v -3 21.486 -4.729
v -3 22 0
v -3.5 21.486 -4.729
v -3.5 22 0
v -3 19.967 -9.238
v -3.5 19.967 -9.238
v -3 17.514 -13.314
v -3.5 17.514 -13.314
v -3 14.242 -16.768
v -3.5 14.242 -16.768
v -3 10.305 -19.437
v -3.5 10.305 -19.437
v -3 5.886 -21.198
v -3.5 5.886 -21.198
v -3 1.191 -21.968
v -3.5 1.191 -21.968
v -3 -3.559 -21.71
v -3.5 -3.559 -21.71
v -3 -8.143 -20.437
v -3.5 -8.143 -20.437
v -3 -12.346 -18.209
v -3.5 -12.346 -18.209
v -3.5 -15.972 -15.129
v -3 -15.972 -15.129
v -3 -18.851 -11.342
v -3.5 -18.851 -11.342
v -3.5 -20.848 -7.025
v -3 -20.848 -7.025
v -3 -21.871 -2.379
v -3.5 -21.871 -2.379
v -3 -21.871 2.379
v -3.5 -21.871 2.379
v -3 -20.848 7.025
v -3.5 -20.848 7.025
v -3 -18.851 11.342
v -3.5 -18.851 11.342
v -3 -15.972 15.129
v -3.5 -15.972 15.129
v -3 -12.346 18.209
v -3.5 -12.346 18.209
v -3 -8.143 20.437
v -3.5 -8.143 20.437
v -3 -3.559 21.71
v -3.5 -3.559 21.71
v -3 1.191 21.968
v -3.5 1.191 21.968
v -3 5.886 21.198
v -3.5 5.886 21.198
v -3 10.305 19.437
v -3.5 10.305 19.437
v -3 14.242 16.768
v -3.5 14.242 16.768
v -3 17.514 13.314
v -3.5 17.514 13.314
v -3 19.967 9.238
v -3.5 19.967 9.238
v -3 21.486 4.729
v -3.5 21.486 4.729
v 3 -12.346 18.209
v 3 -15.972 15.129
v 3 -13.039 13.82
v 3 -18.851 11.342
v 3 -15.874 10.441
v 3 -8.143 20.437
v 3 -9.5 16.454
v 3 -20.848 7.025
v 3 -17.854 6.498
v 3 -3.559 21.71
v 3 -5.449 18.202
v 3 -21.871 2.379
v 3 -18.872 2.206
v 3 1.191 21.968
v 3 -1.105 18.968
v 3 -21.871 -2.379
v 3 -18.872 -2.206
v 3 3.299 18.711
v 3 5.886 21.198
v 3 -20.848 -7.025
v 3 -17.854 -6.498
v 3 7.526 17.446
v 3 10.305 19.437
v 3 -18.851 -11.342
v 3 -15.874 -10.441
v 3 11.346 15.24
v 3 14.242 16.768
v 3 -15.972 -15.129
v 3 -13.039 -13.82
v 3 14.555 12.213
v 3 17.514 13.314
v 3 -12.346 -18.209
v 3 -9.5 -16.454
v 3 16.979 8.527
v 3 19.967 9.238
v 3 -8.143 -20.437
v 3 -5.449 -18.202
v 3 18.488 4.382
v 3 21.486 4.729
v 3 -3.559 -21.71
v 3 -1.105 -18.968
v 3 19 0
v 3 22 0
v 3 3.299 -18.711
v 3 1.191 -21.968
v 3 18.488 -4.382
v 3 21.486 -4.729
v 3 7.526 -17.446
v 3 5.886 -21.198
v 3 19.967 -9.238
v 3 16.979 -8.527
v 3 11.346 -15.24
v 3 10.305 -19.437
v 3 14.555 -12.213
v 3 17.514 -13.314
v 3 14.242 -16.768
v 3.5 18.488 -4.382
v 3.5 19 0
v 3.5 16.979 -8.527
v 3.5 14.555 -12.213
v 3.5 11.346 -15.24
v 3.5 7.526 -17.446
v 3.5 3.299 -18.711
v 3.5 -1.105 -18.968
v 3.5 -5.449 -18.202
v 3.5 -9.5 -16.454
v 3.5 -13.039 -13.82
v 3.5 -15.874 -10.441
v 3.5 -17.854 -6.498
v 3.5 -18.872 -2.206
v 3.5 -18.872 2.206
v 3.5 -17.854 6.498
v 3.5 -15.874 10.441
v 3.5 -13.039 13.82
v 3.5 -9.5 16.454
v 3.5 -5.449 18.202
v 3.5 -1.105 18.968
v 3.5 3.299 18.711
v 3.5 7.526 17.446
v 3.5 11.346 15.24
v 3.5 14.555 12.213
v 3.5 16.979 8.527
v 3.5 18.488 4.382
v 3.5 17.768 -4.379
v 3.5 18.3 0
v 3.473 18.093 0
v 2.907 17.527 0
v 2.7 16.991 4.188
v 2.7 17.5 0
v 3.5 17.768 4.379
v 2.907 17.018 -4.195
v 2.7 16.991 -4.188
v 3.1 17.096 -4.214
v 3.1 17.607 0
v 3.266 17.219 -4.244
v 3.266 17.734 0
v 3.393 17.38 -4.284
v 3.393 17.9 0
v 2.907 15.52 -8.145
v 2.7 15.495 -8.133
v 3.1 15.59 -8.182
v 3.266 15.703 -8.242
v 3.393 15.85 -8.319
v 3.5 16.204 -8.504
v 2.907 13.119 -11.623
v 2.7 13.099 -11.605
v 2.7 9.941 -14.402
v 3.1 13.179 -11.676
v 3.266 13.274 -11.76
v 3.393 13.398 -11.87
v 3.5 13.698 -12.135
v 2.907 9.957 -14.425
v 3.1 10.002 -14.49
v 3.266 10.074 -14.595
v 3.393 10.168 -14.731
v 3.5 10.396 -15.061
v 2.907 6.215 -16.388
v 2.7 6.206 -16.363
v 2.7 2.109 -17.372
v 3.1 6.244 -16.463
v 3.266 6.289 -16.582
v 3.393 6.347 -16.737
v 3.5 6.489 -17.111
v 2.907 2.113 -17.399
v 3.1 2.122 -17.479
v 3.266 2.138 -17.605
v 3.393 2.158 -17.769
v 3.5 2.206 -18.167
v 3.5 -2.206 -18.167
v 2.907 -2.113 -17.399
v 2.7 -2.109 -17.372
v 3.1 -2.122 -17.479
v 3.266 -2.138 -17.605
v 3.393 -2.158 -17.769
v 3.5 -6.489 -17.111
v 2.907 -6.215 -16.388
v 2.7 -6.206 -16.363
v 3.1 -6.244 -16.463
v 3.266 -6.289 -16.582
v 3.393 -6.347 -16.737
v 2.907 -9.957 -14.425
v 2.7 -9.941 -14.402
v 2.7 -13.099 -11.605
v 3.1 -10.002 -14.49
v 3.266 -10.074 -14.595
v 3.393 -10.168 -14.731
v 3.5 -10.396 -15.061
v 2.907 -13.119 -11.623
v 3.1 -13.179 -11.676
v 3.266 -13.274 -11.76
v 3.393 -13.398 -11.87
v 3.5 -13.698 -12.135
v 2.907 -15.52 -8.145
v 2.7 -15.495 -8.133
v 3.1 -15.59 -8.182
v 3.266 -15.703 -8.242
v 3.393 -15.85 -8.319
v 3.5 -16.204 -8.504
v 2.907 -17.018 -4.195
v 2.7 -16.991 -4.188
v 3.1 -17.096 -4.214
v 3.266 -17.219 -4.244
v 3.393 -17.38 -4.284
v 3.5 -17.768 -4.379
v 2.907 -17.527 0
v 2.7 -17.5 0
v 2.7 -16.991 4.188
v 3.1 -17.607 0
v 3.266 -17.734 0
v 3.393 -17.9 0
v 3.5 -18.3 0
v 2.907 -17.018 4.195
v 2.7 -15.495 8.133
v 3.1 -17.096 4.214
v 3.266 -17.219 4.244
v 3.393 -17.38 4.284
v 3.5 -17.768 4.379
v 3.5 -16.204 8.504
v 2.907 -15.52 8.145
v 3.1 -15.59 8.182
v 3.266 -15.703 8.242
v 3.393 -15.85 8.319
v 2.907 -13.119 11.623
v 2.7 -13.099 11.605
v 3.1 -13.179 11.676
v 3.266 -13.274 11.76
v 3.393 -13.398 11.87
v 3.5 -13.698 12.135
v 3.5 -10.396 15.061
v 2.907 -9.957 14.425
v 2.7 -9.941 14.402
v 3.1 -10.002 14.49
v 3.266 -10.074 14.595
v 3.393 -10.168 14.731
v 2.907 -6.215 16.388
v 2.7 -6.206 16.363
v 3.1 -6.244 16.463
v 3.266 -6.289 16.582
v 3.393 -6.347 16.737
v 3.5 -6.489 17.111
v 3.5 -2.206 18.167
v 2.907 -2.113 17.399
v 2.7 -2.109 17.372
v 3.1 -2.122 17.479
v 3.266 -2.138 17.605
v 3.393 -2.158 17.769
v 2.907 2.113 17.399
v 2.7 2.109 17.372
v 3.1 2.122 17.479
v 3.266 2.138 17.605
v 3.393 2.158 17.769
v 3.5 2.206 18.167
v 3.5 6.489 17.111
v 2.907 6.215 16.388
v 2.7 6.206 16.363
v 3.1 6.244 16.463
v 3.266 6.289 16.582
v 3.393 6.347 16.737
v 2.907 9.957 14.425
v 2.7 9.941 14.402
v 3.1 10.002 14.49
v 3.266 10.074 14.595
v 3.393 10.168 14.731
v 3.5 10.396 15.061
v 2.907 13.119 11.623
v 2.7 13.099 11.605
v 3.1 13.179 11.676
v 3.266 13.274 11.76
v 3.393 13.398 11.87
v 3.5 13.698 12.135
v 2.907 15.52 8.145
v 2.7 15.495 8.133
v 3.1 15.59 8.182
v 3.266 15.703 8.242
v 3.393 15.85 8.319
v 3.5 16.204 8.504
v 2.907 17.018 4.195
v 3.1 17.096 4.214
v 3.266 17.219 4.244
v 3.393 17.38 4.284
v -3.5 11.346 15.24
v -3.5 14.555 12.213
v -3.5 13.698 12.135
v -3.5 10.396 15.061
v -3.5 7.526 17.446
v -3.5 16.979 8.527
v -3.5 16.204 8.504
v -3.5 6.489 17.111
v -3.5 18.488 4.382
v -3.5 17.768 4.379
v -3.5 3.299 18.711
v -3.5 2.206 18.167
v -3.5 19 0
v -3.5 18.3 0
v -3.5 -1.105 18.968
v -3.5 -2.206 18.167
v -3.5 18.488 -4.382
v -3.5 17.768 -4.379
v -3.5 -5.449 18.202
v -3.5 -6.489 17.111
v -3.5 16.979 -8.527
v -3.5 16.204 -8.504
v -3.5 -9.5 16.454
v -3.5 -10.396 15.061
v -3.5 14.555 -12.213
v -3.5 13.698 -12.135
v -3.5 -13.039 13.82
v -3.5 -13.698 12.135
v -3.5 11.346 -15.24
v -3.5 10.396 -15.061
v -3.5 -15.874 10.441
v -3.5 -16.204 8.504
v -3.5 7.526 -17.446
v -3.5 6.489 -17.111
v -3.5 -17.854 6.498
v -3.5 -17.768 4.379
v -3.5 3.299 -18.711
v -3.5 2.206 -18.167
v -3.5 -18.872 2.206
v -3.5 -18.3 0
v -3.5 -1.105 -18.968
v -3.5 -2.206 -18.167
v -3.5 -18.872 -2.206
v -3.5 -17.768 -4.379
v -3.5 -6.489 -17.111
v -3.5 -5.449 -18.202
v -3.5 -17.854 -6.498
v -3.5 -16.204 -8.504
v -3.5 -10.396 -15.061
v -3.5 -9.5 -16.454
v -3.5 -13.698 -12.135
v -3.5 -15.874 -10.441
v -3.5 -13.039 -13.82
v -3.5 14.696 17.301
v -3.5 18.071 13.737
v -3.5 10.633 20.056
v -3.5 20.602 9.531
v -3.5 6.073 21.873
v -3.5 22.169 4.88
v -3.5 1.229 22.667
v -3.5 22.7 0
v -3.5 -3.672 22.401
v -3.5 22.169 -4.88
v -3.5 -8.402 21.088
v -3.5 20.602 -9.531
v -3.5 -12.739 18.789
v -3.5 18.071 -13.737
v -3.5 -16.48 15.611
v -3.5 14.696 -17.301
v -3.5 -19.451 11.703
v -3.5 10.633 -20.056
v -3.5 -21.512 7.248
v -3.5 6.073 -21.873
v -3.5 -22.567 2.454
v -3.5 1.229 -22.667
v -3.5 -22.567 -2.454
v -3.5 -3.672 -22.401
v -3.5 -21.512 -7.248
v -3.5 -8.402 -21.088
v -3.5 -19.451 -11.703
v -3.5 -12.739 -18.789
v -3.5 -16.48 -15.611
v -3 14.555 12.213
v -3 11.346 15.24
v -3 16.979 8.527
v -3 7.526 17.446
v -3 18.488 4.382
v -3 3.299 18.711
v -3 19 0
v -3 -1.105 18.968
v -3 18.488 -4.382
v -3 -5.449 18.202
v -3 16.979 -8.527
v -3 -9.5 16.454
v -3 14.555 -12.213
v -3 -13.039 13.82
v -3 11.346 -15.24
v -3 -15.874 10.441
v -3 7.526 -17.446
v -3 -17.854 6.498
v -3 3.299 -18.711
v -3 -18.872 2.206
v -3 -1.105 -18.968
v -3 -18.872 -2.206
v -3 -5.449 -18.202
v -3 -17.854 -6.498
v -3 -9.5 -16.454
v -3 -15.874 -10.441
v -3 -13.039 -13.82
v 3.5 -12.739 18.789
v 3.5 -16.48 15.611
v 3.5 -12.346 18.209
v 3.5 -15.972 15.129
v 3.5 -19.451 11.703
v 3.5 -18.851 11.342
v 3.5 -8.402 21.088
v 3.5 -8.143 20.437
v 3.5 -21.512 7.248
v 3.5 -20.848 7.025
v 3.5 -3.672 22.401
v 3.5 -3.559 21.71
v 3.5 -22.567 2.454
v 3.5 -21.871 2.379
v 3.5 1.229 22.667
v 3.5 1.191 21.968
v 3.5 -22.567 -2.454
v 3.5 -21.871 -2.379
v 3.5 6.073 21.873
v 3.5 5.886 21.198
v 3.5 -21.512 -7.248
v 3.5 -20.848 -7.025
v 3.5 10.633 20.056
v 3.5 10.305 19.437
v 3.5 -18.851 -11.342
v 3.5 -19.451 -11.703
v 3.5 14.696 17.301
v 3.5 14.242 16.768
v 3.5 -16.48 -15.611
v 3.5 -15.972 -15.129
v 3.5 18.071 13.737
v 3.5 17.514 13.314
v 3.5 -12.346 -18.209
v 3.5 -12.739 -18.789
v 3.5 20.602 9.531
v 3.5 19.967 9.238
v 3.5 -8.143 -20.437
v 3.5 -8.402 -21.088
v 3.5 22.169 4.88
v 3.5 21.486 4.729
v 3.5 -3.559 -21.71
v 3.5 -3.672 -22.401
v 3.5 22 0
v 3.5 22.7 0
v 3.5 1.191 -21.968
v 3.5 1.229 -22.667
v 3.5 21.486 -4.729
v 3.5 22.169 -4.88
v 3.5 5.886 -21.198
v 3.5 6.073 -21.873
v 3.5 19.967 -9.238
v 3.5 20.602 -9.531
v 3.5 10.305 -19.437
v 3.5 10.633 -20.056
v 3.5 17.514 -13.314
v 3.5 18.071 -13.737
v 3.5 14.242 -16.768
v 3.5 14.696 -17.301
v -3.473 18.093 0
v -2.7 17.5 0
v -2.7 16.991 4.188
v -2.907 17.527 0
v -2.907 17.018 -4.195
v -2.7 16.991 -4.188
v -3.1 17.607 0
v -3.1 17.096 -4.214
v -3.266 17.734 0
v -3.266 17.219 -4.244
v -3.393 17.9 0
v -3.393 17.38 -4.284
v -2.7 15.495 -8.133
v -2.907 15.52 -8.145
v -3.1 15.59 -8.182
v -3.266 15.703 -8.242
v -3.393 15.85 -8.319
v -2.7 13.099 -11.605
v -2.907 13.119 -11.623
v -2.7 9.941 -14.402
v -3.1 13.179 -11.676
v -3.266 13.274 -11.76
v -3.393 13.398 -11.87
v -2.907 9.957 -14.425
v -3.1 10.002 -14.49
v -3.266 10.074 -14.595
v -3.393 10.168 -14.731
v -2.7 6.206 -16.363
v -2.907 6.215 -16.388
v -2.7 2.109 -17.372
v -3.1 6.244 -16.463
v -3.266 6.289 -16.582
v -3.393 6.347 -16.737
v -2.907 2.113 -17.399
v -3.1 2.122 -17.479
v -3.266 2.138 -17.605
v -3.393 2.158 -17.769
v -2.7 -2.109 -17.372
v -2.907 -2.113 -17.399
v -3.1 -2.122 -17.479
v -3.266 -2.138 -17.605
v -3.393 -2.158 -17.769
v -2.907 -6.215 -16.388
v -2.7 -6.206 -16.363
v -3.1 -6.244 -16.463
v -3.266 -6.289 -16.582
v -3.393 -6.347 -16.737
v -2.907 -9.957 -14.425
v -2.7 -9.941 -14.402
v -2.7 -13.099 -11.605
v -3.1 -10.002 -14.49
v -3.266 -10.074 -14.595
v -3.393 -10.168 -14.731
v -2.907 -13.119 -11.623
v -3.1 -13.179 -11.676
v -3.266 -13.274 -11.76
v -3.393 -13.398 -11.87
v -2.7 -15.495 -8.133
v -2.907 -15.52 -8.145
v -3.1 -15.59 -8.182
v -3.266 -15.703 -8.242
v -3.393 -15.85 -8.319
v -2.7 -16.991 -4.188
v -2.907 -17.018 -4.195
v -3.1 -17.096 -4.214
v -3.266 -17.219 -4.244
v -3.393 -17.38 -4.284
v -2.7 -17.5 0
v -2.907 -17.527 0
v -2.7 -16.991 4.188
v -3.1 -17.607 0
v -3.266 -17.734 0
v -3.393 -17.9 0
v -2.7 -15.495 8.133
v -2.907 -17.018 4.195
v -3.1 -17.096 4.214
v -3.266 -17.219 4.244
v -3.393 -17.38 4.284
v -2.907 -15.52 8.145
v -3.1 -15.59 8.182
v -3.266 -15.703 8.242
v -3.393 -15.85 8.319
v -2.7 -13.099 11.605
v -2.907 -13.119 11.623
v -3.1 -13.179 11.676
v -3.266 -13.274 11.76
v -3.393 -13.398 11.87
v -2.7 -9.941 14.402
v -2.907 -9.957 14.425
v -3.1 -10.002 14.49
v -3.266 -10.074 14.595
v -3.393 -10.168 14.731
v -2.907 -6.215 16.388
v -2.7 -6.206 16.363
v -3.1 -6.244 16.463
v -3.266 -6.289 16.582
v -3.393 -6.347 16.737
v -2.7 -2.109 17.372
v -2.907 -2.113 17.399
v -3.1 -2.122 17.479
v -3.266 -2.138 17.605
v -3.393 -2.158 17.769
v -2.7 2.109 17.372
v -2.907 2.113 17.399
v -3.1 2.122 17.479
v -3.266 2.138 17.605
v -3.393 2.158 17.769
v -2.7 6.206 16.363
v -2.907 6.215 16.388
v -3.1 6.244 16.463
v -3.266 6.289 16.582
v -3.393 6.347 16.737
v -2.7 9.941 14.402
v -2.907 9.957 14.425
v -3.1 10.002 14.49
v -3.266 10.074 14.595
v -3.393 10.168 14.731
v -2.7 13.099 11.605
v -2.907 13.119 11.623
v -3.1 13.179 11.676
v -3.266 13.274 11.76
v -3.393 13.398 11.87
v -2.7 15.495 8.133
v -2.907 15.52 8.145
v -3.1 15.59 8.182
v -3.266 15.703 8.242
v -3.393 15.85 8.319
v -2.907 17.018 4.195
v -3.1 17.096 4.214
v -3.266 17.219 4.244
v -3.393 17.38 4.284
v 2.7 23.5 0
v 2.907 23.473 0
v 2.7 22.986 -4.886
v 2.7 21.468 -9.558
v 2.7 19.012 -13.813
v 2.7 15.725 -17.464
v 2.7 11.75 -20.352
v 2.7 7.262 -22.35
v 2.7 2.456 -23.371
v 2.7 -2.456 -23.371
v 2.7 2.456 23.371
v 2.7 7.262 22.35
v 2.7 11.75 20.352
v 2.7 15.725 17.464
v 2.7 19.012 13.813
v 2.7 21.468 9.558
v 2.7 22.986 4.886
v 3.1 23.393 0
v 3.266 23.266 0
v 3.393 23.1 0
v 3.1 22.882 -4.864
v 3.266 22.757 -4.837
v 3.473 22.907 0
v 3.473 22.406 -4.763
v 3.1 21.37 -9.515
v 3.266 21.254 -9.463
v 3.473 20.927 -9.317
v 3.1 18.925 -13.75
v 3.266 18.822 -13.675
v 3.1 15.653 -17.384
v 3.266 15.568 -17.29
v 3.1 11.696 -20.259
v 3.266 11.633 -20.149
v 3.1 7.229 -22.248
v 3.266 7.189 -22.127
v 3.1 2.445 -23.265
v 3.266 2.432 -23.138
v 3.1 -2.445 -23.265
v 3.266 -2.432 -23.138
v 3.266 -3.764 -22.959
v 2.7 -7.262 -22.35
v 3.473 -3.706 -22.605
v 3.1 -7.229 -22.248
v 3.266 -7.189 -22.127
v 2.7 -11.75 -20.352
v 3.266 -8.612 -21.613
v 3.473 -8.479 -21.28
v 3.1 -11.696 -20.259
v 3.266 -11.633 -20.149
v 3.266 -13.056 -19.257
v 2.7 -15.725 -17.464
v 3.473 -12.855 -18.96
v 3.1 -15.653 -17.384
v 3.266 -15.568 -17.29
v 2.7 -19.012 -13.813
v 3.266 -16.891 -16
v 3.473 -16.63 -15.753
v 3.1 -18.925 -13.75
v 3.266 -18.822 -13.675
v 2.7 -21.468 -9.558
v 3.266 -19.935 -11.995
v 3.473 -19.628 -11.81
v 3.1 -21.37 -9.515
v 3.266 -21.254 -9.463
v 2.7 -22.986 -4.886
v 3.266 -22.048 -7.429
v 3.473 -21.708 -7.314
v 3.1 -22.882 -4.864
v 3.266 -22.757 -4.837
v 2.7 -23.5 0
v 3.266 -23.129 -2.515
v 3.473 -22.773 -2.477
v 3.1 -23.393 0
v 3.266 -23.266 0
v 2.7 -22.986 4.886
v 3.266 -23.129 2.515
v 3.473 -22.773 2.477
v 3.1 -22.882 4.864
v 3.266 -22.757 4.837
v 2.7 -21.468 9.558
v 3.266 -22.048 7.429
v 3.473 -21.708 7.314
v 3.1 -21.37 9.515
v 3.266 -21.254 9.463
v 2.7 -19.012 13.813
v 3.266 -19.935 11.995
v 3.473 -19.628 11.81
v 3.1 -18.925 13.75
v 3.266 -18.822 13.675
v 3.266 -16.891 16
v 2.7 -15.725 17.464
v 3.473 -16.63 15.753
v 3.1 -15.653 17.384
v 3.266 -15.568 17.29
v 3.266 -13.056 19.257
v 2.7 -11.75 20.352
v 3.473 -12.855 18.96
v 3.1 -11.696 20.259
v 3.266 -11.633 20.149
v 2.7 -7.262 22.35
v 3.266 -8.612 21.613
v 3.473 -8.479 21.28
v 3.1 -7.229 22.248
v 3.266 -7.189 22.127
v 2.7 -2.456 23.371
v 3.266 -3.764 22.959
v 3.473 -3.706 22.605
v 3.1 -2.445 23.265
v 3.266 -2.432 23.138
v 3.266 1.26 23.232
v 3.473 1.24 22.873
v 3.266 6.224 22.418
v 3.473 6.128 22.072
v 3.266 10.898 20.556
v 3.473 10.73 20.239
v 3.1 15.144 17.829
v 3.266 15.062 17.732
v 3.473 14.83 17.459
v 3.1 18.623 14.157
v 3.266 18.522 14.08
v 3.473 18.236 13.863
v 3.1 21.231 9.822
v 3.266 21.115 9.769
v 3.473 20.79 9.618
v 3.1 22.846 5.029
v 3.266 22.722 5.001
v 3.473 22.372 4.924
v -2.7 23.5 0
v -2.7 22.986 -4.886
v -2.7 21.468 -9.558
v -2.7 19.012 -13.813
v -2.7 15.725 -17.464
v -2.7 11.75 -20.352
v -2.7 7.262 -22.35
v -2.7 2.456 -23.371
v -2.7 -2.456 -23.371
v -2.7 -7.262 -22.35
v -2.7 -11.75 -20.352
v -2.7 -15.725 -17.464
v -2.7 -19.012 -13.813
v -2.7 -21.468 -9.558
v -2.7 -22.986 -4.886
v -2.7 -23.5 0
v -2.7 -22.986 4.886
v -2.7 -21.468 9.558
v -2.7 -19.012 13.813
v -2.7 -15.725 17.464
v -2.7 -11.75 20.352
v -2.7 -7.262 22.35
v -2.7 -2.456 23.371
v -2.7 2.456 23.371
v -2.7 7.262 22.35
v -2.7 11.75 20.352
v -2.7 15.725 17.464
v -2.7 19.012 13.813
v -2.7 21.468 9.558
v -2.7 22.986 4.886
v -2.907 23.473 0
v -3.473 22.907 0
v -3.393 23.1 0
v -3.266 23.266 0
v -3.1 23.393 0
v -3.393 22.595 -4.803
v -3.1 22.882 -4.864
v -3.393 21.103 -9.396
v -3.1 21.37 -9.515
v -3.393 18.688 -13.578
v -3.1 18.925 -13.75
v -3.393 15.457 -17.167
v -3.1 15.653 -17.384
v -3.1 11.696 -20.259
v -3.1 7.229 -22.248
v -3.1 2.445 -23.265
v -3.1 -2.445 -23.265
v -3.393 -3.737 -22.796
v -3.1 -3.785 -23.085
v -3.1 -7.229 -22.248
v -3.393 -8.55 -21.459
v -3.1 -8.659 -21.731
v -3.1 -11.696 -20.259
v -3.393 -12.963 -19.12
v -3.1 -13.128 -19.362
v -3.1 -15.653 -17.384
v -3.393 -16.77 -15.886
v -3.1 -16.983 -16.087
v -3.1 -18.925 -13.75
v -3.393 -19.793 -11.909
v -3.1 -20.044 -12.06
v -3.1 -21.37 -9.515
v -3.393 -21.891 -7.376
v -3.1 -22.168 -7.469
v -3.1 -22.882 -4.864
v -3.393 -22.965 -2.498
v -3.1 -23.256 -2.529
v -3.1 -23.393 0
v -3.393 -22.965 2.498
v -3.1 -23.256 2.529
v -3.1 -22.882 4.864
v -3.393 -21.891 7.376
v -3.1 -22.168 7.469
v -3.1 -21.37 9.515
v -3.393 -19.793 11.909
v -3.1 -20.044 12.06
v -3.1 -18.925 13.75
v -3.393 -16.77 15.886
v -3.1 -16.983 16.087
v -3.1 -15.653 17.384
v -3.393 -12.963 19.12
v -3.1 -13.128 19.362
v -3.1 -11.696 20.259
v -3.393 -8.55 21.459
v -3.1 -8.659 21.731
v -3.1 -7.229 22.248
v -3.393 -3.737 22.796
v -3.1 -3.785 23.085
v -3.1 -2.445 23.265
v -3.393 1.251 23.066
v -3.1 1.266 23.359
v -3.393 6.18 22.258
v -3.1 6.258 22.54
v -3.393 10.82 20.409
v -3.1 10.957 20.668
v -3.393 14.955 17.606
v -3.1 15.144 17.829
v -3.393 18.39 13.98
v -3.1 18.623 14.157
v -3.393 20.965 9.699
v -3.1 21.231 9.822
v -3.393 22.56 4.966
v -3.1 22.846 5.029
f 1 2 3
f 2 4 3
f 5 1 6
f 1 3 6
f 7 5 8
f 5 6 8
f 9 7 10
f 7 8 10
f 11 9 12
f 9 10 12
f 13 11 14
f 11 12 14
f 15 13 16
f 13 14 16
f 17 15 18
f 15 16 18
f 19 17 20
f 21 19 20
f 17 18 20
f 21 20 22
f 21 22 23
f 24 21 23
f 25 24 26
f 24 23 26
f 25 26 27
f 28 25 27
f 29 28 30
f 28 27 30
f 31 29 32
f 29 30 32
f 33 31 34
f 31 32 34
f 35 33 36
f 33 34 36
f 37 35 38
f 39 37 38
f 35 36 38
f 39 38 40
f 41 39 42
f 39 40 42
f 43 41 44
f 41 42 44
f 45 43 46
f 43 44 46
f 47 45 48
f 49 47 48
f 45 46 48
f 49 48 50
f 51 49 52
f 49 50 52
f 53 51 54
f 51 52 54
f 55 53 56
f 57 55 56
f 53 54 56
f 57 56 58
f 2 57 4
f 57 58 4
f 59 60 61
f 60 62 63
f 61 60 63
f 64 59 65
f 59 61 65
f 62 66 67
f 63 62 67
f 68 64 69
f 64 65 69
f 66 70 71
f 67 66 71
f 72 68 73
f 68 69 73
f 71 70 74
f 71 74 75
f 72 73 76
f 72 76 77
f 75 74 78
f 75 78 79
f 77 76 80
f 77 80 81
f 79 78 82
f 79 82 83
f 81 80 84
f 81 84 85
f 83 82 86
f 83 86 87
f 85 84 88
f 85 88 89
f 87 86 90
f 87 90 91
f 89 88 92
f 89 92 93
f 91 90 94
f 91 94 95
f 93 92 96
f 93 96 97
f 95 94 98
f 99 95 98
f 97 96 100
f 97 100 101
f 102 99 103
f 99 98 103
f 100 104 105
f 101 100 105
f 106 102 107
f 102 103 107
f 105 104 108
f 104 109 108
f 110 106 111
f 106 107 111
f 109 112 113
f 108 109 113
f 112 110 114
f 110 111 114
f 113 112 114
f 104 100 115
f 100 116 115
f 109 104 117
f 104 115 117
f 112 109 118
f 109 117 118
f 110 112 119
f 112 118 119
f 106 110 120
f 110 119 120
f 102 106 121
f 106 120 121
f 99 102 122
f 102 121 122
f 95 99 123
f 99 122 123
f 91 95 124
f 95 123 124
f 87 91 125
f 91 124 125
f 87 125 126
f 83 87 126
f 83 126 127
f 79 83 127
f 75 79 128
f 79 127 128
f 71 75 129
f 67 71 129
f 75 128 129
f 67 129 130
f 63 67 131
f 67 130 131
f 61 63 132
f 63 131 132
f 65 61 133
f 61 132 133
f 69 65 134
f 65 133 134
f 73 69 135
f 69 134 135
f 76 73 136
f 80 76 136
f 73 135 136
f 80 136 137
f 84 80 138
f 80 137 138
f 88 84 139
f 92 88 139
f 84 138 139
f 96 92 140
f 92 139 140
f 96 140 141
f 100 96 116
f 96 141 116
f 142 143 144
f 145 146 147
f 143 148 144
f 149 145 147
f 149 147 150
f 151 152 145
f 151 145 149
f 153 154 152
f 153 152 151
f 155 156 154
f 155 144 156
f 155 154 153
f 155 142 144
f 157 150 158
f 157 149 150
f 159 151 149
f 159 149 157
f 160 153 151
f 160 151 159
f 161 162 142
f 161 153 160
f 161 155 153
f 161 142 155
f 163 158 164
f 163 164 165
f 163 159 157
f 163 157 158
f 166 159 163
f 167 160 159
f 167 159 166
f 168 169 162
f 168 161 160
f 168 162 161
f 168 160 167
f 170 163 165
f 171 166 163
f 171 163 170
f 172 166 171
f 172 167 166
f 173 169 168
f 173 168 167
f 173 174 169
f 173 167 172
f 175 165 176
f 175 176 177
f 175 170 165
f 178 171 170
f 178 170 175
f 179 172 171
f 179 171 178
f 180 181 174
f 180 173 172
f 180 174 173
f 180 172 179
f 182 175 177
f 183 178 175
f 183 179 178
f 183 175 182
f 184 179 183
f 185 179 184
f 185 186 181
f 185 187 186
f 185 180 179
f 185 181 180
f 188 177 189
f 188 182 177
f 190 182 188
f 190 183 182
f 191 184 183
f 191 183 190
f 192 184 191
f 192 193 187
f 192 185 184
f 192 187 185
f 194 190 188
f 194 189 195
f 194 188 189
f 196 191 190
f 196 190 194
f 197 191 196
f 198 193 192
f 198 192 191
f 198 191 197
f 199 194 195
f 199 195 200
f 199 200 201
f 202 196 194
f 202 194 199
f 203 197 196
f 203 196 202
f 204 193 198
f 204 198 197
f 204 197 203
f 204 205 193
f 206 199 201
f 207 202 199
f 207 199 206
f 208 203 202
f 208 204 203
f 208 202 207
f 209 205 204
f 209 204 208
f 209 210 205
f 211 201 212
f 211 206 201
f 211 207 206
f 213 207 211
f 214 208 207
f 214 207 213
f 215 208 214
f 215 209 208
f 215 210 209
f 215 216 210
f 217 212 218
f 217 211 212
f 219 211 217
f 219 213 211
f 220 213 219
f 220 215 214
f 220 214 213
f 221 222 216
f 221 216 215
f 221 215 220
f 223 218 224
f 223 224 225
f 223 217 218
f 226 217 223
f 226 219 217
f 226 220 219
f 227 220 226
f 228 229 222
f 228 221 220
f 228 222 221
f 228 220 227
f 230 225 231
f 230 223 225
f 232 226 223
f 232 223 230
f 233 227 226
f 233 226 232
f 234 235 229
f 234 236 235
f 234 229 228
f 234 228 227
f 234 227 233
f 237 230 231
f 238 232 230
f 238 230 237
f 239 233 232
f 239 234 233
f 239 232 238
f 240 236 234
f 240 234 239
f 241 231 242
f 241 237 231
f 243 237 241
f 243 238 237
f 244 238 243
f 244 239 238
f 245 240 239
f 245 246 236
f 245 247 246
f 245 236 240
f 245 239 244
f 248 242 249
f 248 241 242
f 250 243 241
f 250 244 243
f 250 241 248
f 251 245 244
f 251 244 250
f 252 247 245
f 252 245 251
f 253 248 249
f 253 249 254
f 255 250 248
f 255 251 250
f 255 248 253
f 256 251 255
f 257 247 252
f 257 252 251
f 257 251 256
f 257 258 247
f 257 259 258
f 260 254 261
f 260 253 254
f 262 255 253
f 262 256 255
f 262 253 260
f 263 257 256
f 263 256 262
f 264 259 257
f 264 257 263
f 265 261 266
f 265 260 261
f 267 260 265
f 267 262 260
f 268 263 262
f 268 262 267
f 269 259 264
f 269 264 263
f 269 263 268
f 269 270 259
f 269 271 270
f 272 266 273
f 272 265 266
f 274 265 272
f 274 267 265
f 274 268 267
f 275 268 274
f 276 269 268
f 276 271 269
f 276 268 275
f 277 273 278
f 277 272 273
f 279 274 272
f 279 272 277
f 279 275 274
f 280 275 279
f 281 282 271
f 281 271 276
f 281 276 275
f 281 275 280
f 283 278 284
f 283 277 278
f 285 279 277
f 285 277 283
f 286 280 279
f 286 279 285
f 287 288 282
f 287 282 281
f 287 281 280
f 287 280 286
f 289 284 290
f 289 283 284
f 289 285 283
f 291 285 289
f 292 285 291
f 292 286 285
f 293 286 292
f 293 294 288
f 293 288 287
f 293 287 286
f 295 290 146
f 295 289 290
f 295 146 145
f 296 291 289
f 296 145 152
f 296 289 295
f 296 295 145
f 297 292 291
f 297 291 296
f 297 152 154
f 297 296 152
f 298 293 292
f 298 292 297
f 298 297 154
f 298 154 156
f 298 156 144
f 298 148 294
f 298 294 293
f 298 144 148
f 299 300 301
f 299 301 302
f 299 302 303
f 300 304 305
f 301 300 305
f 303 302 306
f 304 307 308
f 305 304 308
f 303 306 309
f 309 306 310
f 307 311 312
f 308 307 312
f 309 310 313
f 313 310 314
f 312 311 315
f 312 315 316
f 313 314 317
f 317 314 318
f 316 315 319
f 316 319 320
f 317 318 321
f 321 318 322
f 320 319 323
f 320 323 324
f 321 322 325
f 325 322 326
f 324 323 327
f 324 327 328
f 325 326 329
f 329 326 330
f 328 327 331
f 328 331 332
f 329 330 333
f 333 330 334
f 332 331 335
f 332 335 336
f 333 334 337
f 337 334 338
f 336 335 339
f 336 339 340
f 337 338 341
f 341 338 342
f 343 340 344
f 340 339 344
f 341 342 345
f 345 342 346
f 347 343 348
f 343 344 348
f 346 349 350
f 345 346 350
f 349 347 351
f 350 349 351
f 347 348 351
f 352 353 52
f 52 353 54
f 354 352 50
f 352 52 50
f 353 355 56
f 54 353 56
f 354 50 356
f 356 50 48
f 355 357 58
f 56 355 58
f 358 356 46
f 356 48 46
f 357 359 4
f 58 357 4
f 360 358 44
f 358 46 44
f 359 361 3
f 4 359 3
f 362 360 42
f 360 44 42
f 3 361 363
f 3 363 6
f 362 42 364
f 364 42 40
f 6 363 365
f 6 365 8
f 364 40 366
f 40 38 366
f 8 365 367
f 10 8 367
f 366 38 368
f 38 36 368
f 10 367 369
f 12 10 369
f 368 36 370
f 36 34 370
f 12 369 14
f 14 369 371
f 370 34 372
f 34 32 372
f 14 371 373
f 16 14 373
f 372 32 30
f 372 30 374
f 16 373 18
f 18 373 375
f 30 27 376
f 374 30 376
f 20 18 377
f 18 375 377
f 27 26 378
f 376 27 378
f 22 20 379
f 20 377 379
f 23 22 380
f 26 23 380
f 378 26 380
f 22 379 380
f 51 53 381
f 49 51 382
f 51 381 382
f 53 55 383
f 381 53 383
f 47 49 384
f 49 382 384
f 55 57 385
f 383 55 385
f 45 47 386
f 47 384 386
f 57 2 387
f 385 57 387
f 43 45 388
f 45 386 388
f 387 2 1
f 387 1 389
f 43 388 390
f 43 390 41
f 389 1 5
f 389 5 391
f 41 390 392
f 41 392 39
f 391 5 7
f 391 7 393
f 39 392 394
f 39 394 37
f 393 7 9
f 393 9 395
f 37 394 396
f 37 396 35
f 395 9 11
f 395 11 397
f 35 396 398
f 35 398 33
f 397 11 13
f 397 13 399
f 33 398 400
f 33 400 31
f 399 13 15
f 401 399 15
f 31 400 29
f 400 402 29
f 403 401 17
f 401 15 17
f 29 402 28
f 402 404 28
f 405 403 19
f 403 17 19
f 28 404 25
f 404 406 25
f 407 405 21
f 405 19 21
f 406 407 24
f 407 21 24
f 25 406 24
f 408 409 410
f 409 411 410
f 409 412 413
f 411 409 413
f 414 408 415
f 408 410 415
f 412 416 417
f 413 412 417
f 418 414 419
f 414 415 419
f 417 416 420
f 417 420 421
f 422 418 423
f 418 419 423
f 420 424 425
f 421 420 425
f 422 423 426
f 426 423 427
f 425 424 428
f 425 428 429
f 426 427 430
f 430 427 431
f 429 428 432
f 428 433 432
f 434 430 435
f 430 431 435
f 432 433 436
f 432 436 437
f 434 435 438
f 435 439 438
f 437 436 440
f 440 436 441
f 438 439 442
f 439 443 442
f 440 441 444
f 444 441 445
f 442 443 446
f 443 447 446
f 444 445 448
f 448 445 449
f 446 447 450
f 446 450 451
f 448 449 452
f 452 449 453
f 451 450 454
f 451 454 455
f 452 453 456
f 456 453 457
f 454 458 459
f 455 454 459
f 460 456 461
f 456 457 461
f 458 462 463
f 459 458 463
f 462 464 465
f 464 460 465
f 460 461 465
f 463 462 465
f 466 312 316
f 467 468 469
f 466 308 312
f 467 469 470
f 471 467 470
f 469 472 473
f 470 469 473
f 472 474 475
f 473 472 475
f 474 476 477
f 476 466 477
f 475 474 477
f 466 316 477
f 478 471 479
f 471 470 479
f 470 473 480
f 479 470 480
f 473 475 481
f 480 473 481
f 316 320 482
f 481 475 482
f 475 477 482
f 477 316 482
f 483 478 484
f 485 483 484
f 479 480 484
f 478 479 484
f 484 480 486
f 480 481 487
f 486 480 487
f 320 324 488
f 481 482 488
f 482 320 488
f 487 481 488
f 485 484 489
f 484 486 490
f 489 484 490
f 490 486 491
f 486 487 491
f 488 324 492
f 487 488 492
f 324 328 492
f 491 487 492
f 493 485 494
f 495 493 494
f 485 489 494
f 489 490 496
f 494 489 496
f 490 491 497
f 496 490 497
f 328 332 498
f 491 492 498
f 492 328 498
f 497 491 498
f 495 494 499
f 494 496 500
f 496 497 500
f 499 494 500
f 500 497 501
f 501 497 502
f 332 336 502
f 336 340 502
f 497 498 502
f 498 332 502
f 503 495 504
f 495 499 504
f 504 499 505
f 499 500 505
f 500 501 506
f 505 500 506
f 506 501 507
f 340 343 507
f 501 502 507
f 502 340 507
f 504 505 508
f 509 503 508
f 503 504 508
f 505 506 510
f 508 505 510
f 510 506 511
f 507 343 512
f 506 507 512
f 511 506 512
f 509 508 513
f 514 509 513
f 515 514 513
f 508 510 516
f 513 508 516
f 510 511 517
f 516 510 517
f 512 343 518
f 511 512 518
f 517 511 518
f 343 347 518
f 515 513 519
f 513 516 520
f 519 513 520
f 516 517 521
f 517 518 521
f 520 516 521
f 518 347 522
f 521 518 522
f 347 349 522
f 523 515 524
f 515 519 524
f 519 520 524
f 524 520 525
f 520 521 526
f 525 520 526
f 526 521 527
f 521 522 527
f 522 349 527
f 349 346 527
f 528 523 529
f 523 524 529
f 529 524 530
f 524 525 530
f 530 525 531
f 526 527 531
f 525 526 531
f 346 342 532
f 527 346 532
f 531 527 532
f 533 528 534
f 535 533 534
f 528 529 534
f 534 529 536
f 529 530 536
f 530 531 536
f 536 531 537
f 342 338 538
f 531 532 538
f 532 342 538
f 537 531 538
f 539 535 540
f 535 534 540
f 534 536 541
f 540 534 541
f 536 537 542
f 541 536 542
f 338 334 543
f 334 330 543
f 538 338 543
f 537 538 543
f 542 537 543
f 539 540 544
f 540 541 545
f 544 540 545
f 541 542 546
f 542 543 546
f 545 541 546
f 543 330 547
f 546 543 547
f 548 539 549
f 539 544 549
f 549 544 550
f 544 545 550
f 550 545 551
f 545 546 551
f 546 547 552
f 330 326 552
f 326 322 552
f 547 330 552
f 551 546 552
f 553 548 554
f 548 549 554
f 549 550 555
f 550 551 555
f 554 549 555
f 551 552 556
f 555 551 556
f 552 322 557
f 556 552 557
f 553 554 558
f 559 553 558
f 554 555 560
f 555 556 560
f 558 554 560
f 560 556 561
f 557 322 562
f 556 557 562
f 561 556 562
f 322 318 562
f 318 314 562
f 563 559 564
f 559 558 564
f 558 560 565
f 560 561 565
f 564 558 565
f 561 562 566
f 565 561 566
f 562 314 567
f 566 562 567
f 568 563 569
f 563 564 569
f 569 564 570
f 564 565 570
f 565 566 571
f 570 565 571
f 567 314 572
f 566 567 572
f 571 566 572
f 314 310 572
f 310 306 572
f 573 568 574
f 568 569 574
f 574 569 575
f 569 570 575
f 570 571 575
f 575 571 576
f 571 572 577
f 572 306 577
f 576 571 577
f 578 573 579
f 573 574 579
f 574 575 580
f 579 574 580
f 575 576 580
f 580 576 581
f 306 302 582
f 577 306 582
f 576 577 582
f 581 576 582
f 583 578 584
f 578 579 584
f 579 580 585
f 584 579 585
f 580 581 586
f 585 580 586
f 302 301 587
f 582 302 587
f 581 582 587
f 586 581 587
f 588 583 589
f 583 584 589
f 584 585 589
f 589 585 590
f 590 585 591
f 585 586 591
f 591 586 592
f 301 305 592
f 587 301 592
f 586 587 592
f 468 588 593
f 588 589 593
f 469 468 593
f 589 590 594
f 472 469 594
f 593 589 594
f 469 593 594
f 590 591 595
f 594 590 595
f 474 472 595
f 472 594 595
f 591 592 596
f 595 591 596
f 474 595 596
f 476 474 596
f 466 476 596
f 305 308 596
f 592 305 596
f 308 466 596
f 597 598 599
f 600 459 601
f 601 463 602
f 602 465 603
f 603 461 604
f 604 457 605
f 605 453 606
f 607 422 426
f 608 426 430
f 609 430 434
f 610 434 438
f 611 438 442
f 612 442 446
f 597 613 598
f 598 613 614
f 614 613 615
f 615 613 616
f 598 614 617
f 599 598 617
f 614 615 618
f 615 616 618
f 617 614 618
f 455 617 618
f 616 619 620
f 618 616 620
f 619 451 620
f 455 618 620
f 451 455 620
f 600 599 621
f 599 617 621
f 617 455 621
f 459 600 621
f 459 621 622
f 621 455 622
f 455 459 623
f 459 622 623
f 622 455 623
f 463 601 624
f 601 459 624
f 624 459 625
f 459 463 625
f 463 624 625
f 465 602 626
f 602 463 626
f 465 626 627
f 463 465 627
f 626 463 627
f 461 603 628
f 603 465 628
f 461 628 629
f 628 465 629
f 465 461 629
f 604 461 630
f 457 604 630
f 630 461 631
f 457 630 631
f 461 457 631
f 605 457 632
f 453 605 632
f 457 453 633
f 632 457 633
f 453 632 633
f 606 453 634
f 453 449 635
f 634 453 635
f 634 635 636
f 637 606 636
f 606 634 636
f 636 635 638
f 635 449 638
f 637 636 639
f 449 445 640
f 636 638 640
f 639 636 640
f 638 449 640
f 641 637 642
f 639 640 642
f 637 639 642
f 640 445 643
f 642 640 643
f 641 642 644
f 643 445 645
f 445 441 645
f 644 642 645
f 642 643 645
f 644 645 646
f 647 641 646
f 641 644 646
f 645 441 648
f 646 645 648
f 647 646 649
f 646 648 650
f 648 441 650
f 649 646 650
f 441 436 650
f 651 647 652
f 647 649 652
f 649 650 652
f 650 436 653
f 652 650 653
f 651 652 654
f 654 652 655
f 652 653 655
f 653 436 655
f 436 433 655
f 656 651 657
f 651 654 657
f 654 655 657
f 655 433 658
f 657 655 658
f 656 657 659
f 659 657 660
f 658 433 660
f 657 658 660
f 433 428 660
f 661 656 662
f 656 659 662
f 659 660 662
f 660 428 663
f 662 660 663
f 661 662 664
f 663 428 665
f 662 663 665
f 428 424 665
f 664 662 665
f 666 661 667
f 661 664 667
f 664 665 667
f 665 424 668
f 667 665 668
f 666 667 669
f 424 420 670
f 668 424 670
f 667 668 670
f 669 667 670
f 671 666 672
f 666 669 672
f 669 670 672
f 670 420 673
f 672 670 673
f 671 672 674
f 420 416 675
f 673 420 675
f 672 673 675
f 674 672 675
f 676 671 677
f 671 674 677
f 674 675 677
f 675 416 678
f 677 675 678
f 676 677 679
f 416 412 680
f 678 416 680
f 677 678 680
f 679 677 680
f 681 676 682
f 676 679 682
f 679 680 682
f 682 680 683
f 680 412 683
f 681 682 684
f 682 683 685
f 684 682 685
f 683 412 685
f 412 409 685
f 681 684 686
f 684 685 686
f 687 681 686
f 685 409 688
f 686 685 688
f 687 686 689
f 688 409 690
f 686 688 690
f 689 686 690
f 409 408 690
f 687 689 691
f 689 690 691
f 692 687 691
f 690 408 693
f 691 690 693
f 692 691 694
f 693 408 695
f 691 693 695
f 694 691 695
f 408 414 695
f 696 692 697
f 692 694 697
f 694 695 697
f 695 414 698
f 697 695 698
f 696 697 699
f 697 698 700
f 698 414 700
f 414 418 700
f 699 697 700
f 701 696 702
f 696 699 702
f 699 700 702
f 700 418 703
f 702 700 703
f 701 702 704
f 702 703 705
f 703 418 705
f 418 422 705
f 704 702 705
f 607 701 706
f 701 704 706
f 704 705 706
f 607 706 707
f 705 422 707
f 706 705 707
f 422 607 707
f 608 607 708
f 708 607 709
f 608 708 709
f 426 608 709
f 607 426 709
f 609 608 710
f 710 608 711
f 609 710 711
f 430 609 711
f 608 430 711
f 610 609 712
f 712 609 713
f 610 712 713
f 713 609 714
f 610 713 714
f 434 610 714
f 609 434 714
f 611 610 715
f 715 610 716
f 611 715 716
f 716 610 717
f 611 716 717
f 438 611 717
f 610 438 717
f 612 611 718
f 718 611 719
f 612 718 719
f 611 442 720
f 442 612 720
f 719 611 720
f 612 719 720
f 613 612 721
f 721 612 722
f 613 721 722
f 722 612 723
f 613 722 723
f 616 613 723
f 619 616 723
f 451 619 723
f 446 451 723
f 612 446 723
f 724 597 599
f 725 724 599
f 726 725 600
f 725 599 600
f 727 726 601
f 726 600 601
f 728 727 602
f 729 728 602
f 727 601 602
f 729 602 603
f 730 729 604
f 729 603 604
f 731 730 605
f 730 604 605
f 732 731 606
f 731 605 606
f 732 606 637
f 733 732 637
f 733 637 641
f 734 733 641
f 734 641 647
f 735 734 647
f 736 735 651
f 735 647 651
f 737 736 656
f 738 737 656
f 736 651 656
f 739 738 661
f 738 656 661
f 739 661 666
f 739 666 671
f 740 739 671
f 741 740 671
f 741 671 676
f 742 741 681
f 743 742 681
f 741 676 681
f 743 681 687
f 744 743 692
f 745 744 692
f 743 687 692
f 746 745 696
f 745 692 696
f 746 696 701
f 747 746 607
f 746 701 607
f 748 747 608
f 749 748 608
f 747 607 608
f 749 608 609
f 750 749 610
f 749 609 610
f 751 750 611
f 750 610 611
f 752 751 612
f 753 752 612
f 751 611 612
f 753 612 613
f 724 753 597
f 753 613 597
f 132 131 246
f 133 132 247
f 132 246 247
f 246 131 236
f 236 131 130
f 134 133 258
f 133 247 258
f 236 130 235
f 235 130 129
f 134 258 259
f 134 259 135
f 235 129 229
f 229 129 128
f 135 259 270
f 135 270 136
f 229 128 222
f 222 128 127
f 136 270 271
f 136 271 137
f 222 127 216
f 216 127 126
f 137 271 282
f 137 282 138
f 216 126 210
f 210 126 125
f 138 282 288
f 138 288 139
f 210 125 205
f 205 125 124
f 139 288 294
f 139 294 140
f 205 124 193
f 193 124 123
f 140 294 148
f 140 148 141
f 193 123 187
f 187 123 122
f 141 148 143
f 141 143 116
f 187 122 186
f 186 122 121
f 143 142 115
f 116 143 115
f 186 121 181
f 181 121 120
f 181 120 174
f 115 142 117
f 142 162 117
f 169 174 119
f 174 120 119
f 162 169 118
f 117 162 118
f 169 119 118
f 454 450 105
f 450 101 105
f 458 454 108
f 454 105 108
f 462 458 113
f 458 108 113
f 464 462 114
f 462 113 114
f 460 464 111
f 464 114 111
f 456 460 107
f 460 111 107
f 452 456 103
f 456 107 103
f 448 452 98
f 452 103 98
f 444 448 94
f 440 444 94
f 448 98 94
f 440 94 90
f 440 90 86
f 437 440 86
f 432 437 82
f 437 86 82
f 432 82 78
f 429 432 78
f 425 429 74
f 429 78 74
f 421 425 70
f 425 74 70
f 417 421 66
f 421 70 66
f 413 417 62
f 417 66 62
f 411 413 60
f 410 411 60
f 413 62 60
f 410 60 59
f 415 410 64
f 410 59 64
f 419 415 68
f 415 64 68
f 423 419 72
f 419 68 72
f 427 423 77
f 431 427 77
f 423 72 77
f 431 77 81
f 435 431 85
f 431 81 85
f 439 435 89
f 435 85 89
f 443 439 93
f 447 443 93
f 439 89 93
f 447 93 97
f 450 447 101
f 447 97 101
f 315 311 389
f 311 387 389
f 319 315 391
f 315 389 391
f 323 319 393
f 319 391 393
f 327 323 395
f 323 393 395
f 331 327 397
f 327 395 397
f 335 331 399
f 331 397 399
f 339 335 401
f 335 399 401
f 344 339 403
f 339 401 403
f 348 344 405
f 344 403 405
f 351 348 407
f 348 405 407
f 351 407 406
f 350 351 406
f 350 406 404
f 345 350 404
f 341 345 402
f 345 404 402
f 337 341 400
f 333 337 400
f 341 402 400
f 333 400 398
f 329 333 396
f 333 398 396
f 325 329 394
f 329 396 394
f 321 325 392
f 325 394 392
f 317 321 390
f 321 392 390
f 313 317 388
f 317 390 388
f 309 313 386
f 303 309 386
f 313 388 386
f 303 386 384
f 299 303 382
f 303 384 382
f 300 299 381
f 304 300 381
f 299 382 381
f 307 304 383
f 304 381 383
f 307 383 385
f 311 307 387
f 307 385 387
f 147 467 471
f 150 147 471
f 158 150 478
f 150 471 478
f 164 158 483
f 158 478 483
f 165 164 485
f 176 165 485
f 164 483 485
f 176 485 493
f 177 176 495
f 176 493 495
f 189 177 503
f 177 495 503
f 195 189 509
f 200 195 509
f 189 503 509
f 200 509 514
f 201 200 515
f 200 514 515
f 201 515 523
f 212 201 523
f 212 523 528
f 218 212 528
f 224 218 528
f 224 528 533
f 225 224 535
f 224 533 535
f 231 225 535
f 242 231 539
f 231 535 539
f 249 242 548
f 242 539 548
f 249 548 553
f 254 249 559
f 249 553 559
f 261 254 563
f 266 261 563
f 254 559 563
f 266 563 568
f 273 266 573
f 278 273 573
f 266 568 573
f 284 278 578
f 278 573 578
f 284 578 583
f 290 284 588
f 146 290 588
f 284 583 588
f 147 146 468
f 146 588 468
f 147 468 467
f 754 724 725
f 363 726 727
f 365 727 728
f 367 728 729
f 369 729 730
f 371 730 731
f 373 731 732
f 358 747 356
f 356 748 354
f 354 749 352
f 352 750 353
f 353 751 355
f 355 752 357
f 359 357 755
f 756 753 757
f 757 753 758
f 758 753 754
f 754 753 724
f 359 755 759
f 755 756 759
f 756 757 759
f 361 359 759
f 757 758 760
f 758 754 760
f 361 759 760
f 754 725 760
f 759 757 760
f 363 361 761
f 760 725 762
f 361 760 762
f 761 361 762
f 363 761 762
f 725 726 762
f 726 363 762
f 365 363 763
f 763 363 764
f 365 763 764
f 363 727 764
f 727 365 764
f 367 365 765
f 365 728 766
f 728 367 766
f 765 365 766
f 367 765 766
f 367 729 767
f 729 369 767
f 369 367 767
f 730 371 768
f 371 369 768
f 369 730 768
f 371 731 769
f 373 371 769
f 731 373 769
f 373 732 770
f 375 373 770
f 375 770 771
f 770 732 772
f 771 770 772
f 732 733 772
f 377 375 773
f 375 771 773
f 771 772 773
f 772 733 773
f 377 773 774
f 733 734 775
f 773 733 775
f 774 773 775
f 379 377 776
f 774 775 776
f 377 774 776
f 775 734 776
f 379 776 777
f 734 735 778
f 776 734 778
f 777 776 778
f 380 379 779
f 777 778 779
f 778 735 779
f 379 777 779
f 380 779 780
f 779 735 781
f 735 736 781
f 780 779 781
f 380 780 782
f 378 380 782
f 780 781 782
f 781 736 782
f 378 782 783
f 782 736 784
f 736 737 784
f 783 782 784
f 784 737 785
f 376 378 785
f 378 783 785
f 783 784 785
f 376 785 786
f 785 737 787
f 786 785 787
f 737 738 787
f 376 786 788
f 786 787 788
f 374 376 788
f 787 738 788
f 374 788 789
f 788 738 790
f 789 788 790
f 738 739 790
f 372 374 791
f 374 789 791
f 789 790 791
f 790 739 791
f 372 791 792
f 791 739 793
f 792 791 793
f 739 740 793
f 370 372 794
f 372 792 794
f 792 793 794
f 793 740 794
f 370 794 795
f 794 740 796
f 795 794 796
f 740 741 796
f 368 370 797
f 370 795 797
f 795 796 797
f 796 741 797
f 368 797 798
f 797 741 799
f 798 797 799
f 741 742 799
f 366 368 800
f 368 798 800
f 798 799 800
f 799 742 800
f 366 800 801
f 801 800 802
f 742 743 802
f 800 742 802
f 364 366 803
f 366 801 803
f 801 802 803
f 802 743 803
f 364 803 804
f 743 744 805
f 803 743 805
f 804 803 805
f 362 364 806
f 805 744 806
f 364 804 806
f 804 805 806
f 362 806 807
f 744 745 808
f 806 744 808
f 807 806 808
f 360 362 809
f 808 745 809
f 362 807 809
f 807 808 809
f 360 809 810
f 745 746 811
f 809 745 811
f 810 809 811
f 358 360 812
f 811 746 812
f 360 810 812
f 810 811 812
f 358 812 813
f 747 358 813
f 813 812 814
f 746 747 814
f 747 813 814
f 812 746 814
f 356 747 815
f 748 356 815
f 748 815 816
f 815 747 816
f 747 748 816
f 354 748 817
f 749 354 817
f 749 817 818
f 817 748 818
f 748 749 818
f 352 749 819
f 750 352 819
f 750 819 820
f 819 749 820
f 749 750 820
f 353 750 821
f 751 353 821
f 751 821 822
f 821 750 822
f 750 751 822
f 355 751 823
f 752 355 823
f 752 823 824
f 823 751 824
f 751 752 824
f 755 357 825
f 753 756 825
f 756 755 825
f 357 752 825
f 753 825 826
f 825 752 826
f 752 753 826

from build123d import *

# Parameters (mm, degrees)
FILLET_1_R = 0.8


with BuildPart() as part:
    # Эскиз1 → Повернуть1 (revolve)
    with BuildSketch(Plane.XY):
        Polygon((3.5, 17.5), (-3.5, 17.5), (-3.5, 19), (-3, 19), (-3, 22), (-3.5, 22), (-3.5, 23.5), (3.5, 23.5), (3.5, 22), (3, 22), (3, 19), (3.5, 19), align=None)
    revolve(axis=Axis((0, 0, 0), (-1, 0, 0)))

    # Скругление1
    fillet_1_edges = [part.edges().sort_by_distance(p)[0] for p in [
        (-3.5, -23.5, 0),
        (3.5, -23.5, 0),
        (3.5, -17.5, 0),
        (-3.5, -17.5, 0),
    ]]
    fillet(fillet_1_edges, radius=FILLET_1_R)


solid = part.part
